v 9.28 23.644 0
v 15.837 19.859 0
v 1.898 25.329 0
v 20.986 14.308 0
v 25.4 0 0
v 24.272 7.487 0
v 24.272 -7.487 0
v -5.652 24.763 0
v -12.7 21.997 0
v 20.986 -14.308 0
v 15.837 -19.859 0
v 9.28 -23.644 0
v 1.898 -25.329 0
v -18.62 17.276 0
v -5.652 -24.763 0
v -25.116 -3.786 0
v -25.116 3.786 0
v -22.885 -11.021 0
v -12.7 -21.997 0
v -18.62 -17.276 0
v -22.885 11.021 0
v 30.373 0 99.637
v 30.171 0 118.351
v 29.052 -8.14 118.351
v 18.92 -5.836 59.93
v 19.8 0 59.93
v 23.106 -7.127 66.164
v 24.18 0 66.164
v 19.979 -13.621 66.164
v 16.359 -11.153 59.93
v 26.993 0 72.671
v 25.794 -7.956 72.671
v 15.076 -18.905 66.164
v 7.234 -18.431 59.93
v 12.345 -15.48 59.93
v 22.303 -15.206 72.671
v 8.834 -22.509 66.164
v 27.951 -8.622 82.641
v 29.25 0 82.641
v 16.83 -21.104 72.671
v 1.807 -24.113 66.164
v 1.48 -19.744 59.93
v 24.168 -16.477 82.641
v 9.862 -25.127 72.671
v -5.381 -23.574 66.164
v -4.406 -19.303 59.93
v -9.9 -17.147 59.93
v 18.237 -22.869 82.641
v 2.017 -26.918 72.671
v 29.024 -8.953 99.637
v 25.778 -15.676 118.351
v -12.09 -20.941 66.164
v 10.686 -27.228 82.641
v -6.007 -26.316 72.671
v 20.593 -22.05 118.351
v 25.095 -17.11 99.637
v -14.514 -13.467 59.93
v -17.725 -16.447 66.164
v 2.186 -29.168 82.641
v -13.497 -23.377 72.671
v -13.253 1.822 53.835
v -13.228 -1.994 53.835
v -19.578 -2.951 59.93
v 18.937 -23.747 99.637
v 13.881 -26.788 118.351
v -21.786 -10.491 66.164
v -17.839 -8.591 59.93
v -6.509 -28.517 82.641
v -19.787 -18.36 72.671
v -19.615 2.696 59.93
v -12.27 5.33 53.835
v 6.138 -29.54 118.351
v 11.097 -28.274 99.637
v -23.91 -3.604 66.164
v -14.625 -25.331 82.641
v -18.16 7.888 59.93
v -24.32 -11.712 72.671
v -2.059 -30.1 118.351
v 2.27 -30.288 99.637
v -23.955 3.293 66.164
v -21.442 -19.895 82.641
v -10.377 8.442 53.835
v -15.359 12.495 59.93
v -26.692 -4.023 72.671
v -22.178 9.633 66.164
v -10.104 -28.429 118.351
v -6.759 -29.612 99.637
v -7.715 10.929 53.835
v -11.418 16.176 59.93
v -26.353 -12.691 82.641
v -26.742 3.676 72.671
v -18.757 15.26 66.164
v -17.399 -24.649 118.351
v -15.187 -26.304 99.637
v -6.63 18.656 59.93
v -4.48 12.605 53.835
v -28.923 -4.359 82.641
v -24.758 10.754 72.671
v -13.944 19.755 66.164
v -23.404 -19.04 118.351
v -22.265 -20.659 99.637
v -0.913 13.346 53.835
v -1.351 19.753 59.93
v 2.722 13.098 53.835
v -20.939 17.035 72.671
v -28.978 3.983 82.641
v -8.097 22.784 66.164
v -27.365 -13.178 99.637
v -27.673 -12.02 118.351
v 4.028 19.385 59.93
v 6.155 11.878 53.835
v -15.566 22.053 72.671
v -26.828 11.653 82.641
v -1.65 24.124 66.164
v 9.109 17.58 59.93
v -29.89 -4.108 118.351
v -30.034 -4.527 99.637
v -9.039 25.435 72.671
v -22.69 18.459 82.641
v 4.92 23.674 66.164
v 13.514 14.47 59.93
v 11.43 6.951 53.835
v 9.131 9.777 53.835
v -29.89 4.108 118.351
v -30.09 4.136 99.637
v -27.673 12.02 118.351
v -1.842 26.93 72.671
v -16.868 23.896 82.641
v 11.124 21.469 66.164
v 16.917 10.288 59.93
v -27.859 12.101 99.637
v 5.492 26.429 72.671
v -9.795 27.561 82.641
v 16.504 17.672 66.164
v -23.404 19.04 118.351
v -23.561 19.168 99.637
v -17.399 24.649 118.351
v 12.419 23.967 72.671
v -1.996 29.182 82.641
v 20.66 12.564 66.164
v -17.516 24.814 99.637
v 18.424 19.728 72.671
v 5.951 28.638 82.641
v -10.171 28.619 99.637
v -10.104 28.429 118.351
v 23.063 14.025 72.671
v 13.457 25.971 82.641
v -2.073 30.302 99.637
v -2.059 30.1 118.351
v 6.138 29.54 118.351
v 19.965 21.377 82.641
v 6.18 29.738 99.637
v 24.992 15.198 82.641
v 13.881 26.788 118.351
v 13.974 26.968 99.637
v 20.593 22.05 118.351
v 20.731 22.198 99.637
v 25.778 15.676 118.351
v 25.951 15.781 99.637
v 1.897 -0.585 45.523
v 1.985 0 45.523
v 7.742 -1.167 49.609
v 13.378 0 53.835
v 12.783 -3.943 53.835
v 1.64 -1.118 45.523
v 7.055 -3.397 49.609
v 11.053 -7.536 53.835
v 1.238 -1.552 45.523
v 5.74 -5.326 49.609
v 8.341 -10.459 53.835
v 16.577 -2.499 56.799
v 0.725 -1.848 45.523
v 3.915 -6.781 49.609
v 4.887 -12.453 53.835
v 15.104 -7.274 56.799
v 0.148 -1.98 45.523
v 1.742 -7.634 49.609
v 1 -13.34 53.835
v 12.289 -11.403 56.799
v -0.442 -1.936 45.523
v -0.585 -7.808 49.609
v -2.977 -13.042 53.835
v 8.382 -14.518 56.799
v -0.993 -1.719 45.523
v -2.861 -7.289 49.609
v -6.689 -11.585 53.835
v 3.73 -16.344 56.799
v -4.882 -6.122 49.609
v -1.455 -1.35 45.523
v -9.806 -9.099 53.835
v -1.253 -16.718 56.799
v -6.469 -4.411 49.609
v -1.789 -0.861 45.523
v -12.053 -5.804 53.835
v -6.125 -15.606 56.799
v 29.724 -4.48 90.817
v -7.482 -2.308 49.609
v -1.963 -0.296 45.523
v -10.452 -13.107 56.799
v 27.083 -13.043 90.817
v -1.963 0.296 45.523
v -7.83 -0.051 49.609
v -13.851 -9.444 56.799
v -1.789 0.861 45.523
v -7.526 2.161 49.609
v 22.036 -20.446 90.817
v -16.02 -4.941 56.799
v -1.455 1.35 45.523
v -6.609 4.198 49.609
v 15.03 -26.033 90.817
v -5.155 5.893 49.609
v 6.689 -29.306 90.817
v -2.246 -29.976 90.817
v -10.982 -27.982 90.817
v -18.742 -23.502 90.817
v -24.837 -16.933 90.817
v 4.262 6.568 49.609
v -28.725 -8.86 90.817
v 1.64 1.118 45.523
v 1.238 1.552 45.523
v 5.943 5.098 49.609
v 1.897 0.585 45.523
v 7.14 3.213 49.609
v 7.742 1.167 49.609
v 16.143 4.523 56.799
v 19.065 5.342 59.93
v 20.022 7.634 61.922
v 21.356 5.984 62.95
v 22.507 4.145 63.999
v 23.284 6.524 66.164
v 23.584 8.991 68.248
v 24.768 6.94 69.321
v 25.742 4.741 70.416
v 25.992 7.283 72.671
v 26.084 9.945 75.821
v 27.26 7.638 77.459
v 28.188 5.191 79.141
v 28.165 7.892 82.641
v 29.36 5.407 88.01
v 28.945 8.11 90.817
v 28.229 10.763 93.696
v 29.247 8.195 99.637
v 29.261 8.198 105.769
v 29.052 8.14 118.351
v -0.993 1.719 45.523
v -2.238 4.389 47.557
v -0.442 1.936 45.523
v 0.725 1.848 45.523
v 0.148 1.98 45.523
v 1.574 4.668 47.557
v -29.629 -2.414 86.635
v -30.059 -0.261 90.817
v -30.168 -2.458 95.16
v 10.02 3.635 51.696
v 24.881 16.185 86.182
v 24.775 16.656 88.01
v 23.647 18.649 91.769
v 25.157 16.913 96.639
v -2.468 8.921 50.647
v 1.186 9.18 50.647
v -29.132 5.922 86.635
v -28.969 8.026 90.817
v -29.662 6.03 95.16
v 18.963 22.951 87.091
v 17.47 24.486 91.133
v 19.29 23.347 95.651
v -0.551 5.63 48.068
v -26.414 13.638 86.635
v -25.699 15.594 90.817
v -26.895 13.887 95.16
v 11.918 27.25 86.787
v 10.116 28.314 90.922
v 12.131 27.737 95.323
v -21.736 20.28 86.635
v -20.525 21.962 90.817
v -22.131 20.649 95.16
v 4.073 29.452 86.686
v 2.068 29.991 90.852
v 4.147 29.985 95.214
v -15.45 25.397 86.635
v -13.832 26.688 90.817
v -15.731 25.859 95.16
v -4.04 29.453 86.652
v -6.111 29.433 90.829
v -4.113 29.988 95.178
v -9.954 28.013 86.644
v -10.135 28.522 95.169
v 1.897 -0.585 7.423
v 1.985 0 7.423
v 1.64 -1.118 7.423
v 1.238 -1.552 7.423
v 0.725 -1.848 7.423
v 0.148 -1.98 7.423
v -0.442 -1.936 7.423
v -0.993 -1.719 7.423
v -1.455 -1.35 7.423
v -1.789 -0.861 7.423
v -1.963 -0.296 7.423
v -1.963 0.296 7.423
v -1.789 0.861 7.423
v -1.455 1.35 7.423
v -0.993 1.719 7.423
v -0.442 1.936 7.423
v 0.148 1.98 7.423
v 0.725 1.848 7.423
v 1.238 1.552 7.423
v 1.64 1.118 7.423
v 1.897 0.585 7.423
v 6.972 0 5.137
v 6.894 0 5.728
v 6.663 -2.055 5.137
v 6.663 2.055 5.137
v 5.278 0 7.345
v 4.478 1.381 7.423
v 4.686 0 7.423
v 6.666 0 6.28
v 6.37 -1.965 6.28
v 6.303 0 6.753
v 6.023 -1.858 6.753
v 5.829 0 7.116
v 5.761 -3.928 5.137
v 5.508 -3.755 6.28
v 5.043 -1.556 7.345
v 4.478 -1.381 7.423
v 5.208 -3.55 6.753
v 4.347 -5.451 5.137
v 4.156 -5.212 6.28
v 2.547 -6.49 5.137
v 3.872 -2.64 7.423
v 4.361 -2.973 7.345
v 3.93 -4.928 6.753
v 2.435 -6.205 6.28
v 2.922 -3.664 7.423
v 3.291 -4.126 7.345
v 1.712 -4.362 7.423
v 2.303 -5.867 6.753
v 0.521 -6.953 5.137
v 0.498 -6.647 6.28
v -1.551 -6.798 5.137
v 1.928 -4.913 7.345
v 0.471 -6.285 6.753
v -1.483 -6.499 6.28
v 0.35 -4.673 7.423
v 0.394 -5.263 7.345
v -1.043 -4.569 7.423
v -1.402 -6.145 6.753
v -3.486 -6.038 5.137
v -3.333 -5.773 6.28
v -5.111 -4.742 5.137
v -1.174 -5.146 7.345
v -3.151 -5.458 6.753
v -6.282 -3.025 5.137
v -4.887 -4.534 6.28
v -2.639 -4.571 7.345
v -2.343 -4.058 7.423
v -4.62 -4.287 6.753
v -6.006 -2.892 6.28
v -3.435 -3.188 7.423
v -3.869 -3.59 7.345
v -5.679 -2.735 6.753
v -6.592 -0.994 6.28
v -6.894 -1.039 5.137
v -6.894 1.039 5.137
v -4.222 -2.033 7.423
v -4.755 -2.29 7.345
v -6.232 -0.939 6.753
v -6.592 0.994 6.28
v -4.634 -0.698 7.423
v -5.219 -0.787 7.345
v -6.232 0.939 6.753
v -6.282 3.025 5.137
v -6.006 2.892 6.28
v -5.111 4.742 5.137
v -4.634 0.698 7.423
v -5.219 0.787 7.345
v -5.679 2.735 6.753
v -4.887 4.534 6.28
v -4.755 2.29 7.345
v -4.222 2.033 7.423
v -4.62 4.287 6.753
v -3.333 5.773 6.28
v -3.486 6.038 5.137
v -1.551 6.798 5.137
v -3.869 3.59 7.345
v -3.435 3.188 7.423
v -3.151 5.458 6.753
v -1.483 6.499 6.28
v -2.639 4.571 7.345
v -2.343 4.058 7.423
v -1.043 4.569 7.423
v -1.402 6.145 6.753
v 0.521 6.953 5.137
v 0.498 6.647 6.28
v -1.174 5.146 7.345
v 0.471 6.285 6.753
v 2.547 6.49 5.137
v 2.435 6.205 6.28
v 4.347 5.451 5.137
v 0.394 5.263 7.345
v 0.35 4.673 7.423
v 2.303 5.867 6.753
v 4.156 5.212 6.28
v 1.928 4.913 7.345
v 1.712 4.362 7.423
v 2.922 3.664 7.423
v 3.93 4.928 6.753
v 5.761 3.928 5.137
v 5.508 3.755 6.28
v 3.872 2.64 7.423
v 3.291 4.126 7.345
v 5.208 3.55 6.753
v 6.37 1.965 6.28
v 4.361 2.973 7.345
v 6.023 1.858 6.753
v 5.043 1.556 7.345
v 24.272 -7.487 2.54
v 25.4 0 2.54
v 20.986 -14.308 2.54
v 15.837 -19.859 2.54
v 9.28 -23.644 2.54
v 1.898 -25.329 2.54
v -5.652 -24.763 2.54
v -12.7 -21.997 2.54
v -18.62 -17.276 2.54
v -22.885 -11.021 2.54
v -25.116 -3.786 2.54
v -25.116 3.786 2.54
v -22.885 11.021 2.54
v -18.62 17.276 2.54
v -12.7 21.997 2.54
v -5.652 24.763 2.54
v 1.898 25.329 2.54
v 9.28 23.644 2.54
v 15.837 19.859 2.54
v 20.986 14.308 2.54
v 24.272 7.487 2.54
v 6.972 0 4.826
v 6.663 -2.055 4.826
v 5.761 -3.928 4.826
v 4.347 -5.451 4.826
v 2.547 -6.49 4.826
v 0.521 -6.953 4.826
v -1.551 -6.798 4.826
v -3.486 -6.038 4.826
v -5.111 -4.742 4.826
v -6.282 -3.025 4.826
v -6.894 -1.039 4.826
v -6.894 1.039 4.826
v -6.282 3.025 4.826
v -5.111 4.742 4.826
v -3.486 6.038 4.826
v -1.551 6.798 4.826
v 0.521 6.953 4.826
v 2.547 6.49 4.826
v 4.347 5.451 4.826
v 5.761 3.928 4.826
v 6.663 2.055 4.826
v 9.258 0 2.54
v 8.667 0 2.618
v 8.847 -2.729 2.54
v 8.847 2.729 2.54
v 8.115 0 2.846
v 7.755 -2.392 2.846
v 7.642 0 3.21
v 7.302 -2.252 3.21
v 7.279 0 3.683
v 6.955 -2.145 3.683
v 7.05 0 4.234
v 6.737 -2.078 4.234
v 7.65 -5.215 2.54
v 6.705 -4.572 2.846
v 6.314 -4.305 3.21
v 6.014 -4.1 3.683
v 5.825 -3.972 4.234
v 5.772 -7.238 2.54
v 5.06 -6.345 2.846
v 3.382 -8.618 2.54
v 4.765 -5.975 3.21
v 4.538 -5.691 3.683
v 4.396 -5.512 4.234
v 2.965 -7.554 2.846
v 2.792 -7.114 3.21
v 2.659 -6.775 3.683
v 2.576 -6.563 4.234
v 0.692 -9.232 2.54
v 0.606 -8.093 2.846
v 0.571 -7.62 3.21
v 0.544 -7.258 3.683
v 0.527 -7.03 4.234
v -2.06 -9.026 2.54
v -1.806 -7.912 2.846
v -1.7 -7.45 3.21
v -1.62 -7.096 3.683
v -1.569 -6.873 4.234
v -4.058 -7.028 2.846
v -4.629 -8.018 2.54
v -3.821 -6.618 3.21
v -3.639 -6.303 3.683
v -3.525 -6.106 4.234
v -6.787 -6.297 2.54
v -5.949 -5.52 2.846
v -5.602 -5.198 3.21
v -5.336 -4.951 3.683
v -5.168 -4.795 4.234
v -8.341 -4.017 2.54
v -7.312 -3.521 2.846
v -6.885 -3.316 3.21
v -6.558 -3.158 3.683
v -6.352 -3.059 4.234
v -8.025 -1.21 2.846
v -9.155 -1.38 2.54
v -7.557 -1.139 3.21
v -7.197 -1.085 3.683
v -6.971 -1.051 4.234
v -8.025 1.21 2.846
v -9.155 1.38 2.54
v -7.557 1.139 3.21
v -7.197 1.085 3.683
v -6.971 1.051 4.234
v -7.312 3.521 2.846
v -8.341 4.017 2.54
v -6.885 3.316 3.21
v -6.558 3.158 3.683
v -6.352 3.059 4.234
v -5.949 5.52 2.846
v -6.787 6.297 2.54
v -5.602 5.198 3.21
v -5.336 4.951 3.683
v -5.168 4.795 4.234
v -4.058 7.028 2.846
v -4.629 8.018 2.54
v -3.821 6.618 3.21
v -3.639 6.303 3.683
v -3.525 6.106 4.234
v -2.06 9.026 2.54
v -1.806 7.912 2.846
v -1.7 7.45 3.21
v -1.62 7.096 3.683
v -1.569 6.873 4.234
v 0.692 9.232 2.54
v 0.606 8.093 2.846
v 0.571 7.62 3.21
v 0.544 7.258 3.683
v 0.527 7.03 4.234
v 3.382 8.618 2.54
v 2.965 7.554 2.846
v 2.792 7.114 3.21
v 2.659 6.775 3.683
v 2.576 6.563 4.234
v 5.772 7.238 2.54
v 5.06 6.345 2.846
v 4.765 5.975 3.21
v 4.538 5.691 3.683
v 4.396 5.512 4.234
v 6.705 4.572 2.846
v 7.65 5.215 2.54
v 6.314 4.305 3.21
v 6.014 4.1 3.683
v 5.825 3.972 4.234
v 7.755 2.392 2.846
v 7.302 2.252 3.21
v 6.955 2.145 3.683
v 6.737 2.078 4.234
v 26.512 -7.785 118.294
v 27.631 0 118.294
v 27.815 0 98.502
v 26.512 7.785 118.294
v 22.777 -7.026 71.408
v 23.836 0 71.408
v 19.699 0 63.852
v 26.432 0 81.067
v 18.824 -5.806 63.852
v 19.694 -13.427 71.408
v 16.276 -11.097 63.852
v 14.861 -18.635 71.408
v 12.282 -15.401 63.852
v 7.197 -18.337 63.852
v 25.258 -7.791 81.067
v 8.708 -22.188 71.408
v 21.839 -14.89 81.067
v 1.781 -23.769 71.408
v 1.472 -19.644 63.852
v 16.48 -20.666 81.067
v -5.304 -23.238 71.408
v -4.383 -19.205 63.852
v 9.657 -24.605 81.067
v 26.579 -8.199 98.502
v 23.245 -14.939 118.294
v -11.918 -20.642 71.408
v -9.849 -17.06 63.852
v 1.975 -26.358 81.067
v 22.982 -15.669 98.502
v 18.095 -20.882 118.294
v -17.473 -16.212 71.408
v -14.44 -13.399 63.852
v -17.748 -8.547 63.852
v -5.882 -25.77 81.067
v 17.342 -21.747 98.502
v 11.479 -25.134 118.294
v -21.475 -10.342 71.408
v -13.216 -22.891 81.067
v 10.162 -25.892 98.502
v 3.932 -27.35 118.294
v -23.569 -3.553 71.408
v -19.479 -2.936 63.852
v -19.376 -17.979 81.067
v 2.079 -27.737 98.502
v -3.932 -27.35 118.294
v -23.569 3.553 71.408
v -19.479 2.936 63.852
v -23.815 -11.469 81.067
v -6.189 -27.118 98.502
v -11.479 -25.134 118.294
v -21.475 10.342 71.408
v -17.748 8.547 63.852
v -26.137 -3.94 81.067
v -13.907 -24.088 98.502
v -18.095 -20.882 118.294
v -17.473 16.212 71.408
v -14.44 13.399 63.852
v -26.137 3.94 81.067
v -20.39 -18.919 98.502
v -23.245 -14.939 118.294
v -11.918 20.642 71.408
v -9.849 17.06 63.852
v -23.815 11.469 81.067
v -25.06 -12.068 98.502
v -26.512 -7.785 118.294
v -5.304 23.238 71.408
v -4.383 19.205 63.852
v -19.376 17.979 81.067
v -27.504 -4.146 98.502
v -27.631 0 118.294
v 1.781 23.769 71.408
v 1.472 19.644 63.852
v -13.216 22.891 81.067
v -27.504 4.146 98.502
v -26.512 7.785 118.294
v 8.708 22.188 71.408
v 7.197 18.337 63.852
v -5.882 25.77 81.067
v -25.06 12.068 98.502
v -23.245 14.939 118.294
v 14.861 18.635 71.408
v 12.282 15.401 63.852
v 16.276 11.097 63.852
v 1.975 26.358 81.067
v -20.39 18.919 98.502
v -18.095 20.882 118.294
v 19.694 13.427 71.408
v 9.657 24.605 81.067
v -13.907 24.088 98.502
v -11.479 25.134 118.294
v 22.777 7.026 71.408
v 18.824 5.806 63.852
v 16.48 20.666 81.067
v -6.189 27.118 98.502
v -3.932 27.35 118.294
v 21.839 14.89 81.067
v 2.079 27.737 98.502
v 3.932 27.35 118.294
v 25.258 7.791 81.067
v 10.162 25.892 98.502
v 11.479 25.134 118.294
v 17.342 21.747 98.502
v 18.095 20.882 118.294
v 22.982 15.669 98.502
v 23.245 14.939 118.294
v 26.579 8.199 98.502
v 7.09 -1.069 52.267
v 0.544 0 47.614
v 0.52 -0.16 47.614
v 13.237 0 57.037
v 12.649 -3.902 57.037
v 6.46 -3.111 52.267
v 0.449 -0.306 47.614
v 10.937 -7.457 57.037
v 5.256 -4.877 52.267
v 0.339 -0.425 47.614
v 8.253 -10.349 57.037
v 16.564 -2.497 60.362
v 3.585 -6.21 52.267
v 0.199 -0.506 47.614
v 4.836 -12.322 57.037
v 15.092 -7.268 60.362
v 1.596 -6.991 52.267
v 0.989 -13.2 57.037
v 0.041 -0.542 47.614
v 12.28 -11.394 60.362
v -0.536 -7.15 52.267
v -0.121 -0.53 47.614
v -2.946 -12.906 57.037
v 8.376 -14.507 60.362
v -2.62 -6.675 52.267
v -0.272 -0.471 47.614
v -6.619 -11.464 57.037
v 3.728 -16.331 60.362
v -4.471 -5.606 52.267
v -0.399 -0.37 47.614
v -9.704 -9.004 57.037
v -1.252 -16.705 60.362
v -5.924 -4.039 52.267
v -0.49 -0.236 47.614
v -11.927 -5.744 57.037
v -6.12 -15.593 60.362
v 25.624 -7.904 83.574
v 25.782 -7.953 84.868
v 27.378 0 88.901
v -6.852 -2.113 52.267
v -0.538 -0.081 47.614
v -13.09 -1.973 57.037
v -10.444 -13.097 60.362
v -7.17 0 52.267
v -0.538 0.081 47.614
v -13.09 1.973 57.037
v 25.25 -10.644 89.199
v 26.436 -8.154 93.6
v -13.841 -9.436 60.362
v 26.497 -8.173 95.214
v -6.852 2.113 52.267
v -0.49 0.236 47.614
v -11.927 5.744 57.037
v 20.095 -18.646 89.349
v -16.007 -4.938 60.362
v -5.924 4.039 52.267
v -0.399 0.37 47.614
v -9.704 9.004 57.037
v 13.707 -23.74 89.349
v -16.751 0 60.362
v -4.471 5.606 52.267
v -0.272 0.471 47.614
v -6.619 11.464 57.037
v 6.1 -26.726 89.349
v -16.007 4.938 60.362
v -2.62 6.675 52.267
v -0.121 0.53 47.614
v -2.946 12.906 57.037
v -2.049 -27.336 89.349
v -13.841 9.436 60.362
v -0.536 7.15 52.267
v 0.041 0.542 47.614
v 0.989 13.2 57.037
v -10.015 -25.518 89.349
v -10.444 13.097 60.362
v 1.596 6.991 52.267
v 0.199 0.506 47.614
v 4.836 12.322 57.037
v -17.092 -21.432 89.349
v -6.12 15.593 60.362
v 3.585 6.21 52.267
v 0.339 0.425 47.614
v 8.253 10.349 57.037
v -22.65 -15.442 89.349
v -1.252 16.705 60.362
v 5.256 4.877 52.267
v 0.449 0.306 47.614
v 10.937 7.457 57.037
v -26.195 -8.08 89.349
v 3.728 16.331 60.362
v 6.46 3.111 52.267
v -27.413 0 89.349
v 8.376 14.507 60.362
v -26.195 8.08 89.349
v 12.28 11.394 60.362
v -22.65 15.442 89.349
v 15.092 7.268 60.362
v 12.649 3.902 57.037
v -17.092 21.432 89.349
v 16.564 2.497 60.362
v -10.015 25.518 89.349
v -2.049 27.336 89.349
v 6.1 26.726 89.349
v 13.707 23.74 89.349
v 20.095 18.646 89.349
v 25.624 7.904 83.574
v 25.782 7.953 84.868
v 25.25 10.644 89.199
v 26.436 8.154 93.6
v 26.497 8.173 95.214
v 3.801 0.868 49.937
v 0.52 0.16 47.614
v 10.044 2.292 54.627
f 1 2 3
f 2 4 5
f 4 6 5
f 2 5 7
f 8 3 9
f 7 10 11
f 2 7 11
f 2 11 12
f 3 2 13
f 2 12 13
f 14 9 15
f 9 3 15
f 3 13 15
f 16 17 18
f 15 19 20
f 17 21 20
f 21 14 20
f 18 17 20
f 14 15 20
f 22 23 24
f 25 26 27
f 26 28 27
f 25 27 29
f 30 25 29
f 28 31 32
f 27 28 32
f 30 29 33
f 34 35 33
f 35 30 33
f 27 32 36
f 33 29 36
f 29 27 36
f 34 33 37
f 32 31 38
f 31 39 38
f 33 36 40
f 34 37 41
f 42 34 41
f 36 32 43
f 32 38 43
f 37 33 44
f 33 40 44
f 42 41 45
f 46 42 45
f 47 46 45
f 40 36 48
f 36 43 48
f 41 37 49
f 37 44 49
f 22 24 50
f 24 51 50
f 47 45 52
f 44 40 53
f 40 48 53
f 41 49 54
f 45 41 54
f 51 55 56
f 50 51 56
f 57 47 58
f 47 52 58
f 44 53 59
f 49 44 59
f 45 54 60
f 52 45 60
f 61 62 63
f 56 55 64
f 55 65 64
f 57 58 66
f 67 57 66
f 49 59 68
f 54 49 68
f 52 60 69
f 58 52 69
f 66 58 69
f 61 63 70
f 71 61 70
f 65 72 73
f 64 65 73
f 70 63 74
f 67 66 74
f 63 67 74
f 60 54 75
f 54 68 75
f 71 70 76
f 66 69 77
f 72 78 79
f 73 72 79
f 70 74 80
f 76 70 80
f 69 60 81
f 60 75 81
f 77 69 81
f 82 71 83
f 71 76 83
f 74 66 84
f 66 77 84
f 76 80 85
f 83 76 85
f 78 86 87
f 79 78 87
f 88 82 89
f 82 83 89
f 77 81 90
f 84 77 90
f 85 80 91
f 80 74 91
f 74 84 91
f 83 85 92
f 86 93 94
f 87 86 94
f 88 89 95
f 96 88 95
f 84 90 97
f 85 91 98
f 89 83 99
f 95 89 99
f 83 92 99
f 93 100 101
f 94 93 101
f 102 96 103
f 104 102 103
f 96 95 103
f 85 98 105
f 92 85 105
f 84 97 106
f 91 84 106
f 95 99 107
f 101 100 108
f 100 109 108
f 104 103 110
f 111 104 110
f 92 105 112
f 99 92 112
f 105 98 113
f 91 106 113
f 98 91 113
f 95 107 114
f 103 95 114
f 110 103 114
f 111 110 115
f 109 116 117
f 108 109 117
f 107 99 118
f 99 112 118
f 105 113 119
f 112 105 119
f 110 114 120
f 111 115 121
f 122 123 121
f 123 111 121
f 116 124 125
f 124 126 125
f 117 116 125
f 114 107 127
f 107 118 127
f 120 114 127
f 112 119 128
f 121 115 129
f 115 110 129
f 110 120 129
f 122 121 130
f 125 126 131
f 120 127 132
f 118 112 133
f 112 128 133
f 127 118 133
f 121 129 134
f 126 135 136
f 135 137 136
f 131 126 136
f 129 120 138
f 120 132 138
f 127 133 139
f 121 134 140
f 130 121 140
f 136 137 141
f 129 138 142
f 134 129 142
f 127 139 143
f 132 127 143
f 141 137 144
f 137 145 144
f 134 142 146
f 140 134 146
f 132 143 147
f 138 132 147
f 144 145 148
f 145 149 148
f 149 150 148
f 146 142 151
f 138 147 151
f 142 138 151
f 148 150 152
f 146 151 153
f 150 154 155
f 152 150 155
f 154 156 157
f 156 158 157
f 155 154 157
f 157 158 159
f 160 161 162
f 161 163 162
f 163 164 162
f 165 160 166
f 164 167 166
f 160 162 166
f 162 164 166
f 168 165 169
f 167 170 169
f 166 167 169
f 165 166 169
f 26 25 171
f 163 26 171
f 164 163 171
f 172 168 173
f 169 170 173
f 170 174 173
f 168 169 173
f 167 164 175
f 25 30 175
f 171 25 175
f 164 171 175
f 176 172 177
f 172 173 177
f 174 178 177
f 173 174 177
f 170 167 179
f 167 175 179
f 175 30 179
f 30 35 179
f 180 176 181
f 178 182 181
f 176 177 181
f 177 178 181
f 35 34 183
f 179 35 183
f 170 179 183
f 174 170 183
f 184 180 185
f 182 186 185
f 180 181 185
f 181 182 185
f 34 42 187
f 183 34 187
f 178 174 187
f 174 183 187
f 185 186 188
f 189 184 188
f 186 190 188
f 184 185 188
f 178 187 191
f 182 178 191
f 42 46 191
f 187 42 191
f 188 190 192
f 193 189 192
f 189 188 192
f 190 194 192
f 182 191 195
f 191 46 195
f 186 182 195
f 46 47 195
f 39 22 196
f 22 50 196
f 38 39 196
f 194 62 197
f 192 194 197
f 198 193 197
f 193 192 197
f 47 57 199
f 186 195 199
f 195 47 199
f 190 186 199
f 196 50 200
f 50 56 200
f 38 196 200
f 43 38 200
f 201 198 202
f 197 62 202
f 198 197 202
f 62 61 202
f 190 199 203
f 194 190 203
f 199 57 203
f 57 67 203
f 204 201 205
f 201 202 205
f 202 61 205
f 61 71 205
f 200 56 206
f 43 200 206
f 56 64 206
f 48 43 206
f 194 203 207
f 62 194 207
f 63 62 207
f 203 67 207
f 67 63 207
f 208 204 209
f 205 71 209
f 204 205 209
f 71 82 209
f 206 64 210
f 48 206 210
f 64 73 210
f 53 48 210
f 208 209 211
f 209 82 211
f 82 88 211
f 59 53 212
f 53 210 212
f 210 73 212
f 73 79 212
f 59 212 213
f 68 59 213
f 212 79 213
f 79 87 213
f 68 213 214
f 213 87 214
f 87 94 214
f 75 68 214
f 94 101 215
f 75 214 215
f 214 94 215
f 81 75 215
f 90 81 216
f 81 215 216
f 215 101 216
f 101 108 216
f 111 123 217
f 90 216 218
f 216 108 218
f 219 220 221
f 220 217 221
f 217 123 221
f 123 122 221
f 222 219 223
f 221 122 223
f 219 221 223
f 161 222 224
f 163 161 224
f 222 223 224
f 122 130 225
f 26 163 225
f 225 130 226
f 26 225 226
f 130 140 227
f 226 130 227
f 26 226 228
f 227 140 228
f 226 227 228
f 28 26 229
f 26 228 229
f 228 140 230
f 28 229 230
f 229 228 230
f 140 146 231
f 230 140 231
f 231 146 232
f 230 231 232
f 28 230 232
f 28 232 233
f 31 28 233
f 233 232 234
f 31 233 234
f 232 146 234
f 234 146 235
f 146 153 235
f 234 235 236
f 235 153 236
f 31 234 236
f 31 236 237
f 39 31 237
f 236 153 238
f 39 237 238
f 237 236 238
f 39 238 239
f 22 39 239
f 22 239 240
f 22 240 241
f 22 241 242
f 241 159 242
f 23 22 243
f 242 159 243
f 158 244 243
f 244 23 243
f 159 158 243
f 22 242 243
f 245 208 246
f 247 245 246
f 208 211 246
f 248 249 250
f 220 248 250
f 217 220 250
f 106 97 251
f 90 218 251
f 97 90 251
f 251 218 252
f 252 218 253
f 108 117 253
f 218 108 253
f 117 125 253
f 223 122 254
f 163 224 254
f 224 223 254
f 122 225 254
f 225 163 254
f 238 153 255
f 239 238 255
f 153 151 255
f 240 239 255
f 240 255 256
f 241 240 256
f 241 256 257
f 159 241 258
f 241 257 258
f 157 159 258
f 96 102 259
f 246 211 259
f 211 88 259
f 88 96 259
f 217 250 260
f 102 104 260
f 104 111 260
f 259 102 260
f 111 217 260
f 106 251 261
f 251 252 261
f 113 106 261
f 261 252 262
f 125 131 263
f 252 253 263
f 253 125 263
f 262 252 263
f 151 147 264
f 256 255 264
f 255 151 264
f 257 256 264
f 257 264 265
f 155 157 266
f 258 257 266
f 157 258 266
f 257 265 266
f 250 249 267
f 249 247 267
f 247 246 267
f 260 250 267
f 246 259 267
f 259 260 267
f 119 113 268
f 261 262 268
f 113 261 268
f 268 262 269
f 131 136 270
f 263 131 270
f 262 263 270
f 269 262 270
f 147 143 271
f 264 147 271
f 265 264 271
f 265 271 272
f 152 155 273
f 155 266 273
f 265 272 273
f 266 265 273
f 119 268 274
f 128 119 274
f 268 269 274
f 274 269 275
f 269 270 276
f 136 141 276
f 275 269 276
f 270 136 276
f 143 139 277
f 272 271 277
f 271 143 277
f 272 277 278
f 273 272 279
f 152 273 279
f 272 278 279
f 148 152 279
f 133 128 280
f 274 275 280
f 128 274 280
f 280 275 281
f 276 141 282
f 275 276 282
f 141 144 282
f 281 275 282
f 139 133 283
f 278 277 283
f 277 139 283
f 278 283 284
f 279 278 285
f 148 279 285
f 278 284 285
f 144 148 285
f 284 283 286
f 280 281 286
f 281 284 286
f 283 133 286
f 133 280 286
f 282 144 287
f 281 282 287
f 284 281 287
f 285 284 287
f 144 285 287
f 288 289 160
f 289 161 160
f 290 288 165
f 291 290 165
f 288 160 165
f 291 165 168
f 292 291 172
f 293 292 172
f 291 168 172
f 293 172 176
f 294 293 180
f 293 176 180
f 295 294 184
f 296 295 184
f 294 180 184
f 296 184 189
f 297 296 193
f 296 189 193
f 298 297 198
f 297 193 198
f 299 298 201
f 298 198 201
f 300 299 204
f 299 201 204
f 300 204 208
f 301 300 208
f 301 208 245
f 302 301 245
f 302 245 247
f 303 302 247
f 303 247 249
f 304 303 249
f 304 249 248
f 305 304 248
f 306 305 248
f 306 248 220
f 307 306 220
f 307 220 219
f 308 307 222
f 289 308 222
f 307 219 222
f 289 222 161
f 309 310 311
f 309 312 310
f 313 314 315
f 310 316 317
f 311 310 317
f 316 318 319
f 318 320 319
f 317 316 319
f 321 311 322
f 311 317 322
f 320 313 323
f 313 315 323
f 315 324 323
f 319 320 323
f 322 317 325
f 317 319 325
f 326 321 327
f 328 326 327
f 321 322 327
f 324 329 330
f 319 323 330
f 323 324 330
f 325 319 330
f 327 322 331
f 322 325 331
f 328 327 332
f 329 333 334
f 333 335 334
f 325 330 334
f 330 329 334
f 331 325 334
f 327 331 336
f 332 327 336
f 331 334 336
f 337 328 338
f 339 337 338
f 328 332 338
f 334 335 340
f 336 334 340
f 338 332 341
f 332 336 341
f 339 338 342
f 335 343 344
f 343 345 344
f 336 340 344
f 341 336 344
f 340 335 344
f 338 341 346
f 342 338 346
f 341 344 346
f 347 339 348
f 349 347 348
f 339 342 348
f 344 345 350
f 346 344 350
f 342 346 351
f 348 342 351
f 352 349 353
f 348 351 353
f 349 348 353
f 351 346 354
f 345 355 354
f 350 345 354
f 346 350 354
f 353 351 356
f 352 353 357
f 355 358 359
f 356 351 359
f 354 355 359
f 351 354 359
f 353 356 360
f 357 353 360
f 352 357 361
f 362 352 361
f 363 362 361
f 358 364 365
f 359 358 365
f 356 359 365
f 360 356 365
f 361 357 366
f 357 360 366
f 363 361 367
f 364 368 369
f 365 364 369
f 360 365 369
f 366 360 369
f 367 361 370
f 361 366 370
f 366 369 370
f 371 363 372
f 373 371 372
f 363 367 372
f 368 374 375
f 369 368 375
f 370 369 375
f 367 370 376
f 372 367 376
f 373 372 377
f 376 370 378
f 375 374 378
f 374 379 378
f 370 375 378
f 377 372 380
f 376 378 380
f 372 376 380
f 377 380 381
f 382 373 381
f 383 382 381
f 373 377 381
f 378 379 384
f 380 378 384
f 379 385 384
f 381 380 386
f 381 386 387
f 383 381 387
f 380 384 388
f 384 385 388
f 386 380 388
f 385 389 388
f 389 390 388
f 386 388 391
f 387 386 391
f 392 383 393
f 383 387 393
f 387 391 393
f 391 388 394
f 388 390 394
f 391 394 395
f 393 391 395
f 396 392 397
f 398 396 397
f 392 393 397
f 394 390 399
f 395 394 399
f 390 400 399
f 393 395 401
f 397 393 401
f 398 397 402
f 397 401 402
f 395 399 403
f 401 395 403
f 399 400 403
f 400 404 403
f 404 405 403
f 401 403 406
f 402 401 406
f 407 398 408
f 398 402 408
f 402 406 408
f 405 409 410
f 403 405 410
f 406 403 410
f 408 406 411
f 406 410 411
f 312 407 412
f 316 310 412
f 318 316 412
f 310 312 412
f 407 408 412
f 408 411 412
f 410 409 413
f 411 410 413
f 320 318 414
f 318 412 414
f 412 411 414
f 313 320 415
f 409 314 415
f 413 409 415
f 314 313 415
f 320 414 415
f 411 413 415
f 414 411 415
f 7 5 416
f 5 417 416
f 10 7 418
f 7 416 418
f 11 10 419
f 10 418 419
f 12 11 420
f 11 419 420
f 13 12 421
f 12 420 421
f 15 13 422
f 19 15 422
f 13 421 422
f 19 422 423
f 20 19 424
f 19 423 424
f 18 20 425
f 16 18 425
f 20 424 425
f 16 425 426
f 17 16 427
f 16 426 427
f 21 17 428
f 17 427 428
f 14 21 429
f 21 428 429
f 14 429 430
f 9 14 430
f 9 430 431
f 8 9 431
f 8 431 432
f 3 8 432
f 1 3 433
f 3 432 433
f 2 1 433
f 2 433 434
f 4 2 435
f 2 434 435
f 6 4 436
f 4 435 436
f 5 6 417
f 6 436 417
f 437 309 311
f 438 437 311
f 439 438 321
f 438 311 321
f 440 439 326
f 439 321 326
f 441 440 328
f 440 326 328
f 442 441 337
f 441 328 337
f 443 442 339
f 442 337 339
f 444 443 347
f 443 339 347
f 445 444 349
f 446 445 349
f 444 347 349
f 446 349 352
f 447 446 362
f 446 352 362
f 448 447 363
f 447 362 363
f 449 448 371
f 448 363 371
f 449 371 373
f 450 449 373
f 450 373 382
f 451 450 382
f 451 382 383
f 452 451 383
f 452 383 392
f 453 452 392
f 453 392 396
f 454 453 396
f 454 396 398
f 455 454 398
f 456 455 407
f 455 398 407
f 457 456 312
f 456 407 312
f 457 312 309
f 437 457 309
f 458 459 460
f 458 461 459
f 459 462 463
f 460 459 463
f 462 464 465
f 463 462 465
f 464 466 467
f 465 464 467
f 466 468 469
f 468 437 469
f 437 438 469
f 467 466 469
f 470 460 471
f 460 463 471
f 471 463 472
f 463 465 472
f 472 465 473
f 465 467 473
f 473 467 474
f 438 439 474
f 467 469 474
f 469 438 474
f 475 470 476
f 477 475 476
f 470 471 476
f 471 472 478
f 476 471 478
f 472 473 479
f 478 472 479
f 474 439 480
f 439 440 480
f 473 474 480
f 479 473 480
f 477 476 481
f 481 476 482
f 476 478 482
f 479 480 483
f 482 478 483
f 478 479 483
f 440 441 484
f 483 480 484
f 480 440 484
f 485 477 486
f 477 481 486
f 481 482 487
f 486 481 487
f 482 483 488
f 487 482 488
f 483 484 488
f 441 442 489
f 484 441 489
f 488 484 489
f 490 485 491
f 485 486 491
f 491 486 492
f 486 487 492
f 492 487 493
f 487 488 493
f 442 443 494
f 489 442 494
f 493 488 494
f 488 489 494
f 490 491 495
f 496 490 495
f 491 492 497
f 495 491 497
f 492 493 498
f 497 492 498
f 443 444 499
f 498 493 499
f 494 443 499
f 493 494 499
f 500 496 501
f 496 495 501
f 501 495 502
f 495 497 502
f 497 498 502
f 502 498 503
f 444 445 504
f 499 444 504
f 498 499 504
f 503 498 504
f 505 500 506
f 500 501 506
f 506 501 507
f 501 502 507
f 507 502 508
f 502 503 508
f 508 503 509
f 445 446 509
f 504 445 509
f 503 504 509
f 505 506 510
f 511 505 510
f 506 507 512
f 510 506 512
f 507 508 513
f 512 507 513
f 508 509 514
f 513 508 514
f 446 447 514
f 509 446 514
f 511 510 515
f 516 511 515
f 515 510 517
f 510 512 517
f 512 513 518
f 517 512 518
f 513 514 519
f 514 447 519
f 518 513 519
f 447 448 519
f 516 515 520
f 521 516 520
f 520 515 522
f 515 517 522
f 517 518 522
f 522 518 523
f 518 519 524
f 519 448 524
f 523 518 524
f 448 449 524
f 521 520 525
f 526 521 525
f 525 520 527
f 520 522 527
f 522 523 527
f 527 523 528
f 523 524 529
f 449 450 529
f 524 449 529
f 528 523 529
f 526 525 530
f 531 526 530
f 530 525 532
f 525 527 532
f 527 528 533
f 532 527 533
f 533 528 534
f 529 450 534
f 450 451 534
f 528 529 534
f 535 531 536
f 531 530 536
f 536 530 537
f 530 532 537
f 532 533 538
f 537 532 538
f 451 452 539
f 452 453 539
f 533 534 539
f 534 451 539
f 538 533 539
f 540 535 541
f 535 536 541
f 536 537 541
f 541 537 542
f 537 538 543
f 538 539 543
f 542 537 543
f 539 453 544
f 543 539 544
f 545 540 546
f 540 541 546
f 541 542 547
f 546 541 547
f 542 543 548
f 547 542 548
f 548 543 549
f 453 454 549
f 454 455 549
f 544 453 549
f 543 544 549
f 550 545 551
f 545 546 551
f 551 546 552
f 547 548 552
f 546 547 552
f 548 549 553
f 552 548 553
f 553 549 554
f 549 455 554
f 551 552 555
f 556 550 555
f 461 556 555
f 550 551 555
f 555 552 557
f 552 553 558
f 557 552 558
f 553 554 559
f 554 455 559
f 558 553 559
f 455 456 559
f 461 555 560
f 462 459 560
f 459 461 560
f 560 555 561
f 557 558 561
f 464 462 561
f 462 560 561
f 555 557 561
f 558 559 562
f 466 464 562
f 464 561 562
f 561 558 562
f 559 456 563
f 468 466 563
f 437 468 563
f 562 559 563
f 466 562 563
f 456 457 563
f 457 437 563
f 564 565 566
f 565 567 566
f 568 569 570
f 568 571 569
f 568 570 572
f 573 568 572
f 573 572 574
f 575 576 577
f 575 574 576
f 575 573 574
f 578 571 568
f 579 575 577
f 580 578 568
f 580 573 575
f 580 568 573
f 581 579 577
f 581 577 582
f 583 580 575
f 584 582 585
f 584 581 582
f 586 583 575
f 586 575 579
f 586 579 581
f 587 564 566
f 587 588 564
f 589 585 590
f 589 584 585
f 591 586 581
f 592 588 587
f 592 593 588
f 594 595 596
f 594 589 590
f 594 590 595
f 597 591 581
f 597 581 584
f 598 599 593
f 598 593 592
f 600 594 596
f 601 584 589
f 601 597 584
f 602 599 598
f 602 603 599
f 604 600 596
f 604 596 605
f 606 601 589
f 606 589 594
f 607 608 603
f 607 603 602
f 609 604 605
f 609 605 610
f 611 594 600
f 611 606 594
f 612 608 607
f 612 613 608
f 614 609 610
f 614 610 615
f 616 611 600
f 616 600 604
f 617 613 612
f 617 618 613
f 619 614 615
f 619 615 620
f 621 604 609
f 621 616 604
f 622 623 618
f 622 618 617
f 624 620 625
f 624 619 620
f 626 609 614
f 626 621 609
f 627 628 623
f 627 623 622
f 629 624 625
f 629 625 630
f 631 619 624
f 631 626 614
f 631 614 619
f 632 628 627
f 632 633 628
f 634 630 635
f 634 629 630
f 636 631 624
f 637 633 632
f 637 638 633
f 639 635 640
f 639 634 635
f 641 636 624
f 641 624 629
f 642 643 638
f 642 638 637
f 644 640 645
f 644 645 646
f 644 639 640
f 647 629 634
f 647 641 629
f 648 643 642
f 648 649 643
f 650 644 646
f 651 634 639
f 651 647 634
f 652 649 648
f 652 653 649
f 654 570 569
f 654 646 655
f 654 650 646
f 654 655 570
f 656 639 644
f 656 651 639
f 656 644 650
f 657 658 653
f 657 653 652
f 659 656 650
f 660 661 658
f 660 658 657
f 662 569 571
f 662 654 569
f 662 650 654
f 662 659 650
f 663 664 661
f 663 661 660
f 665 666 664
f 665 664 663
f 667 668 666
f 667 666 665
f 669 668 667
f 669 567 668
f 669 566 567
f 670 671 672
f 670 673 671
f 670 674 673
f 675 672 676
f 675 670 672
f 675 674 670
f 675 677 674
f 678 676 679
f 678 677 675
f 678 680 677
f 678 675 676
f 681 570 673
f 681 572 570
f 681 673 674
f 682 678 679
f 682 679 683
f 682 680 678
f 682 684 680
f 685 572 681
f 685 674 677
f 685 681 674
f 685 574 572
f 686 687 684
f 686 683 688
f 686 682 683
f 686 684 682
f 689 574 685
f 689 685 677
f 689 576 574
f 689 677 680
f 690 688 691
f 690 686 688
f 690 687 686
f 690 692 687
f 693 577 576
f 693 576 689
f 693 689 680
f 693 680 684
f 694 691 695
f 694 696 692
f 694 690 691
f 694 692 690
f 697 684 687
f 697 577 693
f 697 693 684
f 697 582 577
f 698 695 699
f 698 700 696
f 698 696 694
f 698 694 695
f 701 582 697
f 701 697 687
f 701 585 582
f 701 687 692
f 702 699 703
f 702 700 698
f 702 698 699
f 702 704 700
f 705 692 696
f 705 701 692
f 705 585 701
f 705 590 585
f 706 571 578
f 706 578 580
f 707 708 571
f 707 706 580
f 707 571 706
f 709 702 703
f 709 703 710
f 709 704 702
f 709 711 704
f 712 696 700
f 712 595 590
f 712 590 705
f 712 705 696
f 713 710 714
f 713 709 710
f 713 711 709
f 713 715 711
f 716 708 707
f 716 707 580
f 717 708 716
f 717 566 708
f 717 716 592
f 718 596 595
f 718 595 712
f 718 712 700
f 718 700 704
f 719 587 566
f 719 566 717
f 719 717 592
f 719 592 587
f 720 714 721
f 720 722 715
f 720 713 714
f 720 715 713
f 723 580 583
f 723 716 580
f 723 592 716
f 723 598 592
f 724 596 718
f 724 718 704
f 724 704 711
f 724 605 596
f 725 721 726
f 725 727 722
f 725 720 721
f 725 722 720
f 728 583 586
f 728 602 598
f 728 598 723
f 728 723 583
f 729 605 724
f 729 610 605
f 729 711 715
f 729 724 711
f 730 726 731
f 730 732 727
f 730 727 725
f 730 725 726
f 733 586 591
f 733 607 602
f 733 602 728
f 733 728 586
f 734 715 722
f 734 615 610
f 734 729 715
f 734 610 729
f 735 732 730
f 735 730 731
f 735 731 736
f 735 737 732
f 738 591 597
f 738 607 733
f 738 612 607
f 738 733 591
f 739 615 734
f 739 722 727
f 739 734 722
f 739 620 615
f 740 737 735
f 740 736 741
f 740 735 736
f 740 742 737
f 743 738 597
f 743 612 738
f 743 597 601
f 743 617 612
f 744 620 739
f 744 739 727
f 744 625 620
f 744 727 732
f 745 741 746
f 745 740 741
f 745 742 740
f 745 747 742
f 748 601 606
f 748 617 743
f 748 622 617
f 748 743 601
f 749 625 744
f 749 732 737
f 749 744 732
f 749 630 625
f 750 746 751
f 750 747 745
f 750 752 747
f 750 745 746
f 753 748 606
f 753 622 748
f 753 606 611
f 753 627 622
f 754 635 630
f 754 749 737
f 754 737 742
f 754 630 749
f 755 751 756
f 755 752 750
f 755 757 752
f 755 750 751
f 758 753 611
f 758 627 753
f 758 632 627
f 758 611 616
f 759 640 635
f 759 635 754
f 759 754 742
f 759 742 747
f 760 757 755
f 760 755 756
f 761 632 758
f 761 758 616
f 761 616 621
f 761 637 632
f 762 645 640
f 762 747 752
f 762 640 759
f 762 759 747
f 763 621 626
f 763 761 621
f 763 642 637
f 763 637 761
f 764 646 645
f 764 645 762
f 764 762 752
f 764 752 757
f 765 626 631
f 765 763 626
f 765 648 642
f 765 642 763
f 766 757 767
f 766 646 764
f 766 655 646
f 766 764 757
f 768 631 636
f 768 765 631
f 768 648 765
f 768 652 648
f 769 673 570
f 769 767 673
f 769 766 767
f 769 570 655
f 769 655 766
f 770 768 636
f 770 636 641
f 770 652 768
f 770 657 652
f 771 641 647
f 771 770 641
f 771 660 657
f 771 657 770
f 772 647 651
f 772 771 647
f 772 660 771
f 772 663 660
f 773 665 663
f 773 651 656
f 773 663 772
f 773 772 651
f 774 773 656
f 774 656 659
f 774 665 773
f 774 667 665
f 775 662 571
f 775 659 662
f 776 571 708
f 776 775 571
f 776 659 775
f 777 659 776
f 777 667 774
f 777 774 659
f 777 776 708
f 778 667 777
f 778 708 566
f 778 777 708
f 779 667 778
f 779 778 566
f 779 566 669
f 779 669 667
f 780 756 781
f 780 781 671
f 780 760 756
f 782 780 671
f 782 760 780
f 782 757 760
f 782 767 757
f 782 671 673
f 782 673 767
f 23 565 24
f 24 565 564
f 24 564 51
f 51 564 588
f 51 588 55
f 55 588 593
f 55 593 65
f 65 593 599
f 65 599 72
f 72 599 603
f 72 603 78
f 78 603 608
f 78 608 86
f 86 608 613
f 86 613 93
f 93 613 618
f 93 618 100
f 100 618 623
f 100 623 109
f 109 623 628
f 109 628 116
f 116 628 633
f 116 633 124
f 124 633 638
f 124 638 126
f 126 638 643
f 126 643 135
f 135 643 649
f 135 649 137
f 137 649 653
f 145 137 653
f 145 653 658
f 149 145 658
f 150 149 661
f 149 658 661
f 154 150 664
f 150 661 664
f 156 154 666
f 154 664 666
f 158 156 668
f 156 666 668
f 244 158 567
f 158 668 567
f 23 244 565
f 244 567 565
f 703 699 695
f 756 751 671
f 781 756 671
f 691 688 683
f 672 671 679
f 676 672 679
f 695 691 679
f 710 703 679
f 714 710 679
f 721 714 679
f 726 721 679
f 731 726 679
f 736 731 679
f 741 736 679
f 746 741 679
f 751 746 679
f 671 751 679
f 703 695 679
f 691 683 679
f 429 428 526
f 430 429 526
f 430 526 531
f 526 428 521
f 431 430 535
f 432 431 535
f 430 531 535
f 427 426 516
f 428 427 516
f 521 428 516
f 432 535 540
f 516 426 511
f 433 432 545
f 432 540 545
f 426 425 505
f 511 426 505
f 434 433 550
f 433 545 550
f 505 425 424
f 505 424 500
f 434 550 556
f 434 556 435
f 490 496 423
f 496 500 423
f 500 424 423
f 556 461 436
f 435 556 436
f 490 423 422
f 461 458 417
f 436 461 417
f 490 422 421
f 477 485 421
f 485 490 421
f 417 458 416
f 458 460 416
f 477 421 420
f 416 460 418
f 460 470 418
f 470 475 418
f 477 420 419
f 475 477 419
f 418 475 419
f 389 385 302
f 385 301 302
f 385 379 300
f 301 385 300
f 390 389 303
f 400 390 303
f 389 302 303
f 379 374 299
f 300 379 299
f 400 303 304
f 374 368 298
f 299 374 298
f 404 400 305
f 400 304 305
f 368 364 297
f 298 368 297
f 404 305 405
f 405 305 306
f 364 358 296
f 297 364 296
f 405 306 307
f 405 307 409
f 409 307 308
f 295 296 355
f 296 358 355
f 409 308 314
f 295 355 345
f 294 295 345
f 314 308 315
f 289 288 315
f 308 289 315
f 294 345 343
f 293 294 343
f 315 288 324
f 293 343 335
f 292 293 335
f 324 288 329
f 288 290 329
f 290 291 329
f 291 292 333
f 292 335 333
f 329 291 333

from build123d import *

# Parameters (mm, degrees)
F2_R = 2.286


# Not quite as in the source:
# - the dataset's text gives a spline's control points without its knots; the knots are read off the source's solid


with BuildPart() as f1:
    # F0 (on Front) → F1 (revolve)
    with BuildSketch(Plane.XZ):
        with BuildLine():
            Line((0, 47.6139092823), (0, 0))
            Line((0, 0), (25.4, 0))
            Line((25.4, 0), (25.4, 2.54))
            Line((25.4, 2.54), (6.9723119959, 2.54))
            Line((6.9723119959, 2.54), (6.9723119959, 7.4226073921))
            Line((6.9723119959, 7.4226073921), (1.9854572602, 7.4226073921))
            Line((1.9854572602, 7.4226073921), (1.9854572602, 45.5226073921))
            add(Edge.make_bspline(
                [(1.9854572602, 45.5226073921), (9.1183458915, 50.4393489291), (22.9946563844, 60.0043702981), (30.9719457485, 82.3906969255), (30.4589425939, 105.4166327755), (30.1707796752, 118.3507069945)],
                knots=[0, 0, 0, 0, 0.3167510601, 0.6162070217, 1, 1, 1, 1], degree=3))
            Line((30.1707796752, 118.3507069945), (27.6314098305, 118.2941314551))
            add(Edge.make_bspline(
                [(0.5439107281, 47.6139092823), (1.9513426061, 48.5840602454), (4.7520594595, 50.514716622), (8.8009190581, 53.4309124613), (12.587142562, 56.4115346213), (15.431990129, 58.9806996874), (17.4700514796, 61.1037584309), (18.8670813382, 62.7321741187), (20.1249479639, 64.4060497761), (21.6403604896, 66.724897673), (23.2471186454, 69.7952235715), (24.7728044852, 73.8098530535), (25.9405021256, 78.1988066628), (26.7913628714, 82.9987097248), (27.3671494468, 88.2289946642), (27.8215961355, 95.6718703705), (27.9122878106, 105.6813195614), (27.7252634622, 114.0815497541), (27.6314098305, 118.2941314551)],
                knots=[-3e-10, -3e-10, -3e-10, -3e-10, 0.0624999997, 0.1249999998, 0.1874999998, 0.2499999998, 0.2812499998, 0.3124999998, 0.3437499998, 0.3749999998, 0.4374999998, 0.4999999999, 0.5624999999, 0.6249999999, 0.6874999999, 0.7499999999, 0.875, 1, 1, 1, 1], degree=3))
            Line((0.5439107281, 47.6139092823), (0, 47.6139092823))
        make_face()
    revolve(axis=Axis((0, 0, 23.8069546411), (0, 0, -1)))

    # F2
    f2_edges = [f1.edges().sort_by_distance(p)[0] for p in [
        (-6.972312, 0, 7.422607),
        (-6.972312, 0, 2.54),
    ]]
    fillet(f2_edges, radius=F2_R)


solid = f1.part
